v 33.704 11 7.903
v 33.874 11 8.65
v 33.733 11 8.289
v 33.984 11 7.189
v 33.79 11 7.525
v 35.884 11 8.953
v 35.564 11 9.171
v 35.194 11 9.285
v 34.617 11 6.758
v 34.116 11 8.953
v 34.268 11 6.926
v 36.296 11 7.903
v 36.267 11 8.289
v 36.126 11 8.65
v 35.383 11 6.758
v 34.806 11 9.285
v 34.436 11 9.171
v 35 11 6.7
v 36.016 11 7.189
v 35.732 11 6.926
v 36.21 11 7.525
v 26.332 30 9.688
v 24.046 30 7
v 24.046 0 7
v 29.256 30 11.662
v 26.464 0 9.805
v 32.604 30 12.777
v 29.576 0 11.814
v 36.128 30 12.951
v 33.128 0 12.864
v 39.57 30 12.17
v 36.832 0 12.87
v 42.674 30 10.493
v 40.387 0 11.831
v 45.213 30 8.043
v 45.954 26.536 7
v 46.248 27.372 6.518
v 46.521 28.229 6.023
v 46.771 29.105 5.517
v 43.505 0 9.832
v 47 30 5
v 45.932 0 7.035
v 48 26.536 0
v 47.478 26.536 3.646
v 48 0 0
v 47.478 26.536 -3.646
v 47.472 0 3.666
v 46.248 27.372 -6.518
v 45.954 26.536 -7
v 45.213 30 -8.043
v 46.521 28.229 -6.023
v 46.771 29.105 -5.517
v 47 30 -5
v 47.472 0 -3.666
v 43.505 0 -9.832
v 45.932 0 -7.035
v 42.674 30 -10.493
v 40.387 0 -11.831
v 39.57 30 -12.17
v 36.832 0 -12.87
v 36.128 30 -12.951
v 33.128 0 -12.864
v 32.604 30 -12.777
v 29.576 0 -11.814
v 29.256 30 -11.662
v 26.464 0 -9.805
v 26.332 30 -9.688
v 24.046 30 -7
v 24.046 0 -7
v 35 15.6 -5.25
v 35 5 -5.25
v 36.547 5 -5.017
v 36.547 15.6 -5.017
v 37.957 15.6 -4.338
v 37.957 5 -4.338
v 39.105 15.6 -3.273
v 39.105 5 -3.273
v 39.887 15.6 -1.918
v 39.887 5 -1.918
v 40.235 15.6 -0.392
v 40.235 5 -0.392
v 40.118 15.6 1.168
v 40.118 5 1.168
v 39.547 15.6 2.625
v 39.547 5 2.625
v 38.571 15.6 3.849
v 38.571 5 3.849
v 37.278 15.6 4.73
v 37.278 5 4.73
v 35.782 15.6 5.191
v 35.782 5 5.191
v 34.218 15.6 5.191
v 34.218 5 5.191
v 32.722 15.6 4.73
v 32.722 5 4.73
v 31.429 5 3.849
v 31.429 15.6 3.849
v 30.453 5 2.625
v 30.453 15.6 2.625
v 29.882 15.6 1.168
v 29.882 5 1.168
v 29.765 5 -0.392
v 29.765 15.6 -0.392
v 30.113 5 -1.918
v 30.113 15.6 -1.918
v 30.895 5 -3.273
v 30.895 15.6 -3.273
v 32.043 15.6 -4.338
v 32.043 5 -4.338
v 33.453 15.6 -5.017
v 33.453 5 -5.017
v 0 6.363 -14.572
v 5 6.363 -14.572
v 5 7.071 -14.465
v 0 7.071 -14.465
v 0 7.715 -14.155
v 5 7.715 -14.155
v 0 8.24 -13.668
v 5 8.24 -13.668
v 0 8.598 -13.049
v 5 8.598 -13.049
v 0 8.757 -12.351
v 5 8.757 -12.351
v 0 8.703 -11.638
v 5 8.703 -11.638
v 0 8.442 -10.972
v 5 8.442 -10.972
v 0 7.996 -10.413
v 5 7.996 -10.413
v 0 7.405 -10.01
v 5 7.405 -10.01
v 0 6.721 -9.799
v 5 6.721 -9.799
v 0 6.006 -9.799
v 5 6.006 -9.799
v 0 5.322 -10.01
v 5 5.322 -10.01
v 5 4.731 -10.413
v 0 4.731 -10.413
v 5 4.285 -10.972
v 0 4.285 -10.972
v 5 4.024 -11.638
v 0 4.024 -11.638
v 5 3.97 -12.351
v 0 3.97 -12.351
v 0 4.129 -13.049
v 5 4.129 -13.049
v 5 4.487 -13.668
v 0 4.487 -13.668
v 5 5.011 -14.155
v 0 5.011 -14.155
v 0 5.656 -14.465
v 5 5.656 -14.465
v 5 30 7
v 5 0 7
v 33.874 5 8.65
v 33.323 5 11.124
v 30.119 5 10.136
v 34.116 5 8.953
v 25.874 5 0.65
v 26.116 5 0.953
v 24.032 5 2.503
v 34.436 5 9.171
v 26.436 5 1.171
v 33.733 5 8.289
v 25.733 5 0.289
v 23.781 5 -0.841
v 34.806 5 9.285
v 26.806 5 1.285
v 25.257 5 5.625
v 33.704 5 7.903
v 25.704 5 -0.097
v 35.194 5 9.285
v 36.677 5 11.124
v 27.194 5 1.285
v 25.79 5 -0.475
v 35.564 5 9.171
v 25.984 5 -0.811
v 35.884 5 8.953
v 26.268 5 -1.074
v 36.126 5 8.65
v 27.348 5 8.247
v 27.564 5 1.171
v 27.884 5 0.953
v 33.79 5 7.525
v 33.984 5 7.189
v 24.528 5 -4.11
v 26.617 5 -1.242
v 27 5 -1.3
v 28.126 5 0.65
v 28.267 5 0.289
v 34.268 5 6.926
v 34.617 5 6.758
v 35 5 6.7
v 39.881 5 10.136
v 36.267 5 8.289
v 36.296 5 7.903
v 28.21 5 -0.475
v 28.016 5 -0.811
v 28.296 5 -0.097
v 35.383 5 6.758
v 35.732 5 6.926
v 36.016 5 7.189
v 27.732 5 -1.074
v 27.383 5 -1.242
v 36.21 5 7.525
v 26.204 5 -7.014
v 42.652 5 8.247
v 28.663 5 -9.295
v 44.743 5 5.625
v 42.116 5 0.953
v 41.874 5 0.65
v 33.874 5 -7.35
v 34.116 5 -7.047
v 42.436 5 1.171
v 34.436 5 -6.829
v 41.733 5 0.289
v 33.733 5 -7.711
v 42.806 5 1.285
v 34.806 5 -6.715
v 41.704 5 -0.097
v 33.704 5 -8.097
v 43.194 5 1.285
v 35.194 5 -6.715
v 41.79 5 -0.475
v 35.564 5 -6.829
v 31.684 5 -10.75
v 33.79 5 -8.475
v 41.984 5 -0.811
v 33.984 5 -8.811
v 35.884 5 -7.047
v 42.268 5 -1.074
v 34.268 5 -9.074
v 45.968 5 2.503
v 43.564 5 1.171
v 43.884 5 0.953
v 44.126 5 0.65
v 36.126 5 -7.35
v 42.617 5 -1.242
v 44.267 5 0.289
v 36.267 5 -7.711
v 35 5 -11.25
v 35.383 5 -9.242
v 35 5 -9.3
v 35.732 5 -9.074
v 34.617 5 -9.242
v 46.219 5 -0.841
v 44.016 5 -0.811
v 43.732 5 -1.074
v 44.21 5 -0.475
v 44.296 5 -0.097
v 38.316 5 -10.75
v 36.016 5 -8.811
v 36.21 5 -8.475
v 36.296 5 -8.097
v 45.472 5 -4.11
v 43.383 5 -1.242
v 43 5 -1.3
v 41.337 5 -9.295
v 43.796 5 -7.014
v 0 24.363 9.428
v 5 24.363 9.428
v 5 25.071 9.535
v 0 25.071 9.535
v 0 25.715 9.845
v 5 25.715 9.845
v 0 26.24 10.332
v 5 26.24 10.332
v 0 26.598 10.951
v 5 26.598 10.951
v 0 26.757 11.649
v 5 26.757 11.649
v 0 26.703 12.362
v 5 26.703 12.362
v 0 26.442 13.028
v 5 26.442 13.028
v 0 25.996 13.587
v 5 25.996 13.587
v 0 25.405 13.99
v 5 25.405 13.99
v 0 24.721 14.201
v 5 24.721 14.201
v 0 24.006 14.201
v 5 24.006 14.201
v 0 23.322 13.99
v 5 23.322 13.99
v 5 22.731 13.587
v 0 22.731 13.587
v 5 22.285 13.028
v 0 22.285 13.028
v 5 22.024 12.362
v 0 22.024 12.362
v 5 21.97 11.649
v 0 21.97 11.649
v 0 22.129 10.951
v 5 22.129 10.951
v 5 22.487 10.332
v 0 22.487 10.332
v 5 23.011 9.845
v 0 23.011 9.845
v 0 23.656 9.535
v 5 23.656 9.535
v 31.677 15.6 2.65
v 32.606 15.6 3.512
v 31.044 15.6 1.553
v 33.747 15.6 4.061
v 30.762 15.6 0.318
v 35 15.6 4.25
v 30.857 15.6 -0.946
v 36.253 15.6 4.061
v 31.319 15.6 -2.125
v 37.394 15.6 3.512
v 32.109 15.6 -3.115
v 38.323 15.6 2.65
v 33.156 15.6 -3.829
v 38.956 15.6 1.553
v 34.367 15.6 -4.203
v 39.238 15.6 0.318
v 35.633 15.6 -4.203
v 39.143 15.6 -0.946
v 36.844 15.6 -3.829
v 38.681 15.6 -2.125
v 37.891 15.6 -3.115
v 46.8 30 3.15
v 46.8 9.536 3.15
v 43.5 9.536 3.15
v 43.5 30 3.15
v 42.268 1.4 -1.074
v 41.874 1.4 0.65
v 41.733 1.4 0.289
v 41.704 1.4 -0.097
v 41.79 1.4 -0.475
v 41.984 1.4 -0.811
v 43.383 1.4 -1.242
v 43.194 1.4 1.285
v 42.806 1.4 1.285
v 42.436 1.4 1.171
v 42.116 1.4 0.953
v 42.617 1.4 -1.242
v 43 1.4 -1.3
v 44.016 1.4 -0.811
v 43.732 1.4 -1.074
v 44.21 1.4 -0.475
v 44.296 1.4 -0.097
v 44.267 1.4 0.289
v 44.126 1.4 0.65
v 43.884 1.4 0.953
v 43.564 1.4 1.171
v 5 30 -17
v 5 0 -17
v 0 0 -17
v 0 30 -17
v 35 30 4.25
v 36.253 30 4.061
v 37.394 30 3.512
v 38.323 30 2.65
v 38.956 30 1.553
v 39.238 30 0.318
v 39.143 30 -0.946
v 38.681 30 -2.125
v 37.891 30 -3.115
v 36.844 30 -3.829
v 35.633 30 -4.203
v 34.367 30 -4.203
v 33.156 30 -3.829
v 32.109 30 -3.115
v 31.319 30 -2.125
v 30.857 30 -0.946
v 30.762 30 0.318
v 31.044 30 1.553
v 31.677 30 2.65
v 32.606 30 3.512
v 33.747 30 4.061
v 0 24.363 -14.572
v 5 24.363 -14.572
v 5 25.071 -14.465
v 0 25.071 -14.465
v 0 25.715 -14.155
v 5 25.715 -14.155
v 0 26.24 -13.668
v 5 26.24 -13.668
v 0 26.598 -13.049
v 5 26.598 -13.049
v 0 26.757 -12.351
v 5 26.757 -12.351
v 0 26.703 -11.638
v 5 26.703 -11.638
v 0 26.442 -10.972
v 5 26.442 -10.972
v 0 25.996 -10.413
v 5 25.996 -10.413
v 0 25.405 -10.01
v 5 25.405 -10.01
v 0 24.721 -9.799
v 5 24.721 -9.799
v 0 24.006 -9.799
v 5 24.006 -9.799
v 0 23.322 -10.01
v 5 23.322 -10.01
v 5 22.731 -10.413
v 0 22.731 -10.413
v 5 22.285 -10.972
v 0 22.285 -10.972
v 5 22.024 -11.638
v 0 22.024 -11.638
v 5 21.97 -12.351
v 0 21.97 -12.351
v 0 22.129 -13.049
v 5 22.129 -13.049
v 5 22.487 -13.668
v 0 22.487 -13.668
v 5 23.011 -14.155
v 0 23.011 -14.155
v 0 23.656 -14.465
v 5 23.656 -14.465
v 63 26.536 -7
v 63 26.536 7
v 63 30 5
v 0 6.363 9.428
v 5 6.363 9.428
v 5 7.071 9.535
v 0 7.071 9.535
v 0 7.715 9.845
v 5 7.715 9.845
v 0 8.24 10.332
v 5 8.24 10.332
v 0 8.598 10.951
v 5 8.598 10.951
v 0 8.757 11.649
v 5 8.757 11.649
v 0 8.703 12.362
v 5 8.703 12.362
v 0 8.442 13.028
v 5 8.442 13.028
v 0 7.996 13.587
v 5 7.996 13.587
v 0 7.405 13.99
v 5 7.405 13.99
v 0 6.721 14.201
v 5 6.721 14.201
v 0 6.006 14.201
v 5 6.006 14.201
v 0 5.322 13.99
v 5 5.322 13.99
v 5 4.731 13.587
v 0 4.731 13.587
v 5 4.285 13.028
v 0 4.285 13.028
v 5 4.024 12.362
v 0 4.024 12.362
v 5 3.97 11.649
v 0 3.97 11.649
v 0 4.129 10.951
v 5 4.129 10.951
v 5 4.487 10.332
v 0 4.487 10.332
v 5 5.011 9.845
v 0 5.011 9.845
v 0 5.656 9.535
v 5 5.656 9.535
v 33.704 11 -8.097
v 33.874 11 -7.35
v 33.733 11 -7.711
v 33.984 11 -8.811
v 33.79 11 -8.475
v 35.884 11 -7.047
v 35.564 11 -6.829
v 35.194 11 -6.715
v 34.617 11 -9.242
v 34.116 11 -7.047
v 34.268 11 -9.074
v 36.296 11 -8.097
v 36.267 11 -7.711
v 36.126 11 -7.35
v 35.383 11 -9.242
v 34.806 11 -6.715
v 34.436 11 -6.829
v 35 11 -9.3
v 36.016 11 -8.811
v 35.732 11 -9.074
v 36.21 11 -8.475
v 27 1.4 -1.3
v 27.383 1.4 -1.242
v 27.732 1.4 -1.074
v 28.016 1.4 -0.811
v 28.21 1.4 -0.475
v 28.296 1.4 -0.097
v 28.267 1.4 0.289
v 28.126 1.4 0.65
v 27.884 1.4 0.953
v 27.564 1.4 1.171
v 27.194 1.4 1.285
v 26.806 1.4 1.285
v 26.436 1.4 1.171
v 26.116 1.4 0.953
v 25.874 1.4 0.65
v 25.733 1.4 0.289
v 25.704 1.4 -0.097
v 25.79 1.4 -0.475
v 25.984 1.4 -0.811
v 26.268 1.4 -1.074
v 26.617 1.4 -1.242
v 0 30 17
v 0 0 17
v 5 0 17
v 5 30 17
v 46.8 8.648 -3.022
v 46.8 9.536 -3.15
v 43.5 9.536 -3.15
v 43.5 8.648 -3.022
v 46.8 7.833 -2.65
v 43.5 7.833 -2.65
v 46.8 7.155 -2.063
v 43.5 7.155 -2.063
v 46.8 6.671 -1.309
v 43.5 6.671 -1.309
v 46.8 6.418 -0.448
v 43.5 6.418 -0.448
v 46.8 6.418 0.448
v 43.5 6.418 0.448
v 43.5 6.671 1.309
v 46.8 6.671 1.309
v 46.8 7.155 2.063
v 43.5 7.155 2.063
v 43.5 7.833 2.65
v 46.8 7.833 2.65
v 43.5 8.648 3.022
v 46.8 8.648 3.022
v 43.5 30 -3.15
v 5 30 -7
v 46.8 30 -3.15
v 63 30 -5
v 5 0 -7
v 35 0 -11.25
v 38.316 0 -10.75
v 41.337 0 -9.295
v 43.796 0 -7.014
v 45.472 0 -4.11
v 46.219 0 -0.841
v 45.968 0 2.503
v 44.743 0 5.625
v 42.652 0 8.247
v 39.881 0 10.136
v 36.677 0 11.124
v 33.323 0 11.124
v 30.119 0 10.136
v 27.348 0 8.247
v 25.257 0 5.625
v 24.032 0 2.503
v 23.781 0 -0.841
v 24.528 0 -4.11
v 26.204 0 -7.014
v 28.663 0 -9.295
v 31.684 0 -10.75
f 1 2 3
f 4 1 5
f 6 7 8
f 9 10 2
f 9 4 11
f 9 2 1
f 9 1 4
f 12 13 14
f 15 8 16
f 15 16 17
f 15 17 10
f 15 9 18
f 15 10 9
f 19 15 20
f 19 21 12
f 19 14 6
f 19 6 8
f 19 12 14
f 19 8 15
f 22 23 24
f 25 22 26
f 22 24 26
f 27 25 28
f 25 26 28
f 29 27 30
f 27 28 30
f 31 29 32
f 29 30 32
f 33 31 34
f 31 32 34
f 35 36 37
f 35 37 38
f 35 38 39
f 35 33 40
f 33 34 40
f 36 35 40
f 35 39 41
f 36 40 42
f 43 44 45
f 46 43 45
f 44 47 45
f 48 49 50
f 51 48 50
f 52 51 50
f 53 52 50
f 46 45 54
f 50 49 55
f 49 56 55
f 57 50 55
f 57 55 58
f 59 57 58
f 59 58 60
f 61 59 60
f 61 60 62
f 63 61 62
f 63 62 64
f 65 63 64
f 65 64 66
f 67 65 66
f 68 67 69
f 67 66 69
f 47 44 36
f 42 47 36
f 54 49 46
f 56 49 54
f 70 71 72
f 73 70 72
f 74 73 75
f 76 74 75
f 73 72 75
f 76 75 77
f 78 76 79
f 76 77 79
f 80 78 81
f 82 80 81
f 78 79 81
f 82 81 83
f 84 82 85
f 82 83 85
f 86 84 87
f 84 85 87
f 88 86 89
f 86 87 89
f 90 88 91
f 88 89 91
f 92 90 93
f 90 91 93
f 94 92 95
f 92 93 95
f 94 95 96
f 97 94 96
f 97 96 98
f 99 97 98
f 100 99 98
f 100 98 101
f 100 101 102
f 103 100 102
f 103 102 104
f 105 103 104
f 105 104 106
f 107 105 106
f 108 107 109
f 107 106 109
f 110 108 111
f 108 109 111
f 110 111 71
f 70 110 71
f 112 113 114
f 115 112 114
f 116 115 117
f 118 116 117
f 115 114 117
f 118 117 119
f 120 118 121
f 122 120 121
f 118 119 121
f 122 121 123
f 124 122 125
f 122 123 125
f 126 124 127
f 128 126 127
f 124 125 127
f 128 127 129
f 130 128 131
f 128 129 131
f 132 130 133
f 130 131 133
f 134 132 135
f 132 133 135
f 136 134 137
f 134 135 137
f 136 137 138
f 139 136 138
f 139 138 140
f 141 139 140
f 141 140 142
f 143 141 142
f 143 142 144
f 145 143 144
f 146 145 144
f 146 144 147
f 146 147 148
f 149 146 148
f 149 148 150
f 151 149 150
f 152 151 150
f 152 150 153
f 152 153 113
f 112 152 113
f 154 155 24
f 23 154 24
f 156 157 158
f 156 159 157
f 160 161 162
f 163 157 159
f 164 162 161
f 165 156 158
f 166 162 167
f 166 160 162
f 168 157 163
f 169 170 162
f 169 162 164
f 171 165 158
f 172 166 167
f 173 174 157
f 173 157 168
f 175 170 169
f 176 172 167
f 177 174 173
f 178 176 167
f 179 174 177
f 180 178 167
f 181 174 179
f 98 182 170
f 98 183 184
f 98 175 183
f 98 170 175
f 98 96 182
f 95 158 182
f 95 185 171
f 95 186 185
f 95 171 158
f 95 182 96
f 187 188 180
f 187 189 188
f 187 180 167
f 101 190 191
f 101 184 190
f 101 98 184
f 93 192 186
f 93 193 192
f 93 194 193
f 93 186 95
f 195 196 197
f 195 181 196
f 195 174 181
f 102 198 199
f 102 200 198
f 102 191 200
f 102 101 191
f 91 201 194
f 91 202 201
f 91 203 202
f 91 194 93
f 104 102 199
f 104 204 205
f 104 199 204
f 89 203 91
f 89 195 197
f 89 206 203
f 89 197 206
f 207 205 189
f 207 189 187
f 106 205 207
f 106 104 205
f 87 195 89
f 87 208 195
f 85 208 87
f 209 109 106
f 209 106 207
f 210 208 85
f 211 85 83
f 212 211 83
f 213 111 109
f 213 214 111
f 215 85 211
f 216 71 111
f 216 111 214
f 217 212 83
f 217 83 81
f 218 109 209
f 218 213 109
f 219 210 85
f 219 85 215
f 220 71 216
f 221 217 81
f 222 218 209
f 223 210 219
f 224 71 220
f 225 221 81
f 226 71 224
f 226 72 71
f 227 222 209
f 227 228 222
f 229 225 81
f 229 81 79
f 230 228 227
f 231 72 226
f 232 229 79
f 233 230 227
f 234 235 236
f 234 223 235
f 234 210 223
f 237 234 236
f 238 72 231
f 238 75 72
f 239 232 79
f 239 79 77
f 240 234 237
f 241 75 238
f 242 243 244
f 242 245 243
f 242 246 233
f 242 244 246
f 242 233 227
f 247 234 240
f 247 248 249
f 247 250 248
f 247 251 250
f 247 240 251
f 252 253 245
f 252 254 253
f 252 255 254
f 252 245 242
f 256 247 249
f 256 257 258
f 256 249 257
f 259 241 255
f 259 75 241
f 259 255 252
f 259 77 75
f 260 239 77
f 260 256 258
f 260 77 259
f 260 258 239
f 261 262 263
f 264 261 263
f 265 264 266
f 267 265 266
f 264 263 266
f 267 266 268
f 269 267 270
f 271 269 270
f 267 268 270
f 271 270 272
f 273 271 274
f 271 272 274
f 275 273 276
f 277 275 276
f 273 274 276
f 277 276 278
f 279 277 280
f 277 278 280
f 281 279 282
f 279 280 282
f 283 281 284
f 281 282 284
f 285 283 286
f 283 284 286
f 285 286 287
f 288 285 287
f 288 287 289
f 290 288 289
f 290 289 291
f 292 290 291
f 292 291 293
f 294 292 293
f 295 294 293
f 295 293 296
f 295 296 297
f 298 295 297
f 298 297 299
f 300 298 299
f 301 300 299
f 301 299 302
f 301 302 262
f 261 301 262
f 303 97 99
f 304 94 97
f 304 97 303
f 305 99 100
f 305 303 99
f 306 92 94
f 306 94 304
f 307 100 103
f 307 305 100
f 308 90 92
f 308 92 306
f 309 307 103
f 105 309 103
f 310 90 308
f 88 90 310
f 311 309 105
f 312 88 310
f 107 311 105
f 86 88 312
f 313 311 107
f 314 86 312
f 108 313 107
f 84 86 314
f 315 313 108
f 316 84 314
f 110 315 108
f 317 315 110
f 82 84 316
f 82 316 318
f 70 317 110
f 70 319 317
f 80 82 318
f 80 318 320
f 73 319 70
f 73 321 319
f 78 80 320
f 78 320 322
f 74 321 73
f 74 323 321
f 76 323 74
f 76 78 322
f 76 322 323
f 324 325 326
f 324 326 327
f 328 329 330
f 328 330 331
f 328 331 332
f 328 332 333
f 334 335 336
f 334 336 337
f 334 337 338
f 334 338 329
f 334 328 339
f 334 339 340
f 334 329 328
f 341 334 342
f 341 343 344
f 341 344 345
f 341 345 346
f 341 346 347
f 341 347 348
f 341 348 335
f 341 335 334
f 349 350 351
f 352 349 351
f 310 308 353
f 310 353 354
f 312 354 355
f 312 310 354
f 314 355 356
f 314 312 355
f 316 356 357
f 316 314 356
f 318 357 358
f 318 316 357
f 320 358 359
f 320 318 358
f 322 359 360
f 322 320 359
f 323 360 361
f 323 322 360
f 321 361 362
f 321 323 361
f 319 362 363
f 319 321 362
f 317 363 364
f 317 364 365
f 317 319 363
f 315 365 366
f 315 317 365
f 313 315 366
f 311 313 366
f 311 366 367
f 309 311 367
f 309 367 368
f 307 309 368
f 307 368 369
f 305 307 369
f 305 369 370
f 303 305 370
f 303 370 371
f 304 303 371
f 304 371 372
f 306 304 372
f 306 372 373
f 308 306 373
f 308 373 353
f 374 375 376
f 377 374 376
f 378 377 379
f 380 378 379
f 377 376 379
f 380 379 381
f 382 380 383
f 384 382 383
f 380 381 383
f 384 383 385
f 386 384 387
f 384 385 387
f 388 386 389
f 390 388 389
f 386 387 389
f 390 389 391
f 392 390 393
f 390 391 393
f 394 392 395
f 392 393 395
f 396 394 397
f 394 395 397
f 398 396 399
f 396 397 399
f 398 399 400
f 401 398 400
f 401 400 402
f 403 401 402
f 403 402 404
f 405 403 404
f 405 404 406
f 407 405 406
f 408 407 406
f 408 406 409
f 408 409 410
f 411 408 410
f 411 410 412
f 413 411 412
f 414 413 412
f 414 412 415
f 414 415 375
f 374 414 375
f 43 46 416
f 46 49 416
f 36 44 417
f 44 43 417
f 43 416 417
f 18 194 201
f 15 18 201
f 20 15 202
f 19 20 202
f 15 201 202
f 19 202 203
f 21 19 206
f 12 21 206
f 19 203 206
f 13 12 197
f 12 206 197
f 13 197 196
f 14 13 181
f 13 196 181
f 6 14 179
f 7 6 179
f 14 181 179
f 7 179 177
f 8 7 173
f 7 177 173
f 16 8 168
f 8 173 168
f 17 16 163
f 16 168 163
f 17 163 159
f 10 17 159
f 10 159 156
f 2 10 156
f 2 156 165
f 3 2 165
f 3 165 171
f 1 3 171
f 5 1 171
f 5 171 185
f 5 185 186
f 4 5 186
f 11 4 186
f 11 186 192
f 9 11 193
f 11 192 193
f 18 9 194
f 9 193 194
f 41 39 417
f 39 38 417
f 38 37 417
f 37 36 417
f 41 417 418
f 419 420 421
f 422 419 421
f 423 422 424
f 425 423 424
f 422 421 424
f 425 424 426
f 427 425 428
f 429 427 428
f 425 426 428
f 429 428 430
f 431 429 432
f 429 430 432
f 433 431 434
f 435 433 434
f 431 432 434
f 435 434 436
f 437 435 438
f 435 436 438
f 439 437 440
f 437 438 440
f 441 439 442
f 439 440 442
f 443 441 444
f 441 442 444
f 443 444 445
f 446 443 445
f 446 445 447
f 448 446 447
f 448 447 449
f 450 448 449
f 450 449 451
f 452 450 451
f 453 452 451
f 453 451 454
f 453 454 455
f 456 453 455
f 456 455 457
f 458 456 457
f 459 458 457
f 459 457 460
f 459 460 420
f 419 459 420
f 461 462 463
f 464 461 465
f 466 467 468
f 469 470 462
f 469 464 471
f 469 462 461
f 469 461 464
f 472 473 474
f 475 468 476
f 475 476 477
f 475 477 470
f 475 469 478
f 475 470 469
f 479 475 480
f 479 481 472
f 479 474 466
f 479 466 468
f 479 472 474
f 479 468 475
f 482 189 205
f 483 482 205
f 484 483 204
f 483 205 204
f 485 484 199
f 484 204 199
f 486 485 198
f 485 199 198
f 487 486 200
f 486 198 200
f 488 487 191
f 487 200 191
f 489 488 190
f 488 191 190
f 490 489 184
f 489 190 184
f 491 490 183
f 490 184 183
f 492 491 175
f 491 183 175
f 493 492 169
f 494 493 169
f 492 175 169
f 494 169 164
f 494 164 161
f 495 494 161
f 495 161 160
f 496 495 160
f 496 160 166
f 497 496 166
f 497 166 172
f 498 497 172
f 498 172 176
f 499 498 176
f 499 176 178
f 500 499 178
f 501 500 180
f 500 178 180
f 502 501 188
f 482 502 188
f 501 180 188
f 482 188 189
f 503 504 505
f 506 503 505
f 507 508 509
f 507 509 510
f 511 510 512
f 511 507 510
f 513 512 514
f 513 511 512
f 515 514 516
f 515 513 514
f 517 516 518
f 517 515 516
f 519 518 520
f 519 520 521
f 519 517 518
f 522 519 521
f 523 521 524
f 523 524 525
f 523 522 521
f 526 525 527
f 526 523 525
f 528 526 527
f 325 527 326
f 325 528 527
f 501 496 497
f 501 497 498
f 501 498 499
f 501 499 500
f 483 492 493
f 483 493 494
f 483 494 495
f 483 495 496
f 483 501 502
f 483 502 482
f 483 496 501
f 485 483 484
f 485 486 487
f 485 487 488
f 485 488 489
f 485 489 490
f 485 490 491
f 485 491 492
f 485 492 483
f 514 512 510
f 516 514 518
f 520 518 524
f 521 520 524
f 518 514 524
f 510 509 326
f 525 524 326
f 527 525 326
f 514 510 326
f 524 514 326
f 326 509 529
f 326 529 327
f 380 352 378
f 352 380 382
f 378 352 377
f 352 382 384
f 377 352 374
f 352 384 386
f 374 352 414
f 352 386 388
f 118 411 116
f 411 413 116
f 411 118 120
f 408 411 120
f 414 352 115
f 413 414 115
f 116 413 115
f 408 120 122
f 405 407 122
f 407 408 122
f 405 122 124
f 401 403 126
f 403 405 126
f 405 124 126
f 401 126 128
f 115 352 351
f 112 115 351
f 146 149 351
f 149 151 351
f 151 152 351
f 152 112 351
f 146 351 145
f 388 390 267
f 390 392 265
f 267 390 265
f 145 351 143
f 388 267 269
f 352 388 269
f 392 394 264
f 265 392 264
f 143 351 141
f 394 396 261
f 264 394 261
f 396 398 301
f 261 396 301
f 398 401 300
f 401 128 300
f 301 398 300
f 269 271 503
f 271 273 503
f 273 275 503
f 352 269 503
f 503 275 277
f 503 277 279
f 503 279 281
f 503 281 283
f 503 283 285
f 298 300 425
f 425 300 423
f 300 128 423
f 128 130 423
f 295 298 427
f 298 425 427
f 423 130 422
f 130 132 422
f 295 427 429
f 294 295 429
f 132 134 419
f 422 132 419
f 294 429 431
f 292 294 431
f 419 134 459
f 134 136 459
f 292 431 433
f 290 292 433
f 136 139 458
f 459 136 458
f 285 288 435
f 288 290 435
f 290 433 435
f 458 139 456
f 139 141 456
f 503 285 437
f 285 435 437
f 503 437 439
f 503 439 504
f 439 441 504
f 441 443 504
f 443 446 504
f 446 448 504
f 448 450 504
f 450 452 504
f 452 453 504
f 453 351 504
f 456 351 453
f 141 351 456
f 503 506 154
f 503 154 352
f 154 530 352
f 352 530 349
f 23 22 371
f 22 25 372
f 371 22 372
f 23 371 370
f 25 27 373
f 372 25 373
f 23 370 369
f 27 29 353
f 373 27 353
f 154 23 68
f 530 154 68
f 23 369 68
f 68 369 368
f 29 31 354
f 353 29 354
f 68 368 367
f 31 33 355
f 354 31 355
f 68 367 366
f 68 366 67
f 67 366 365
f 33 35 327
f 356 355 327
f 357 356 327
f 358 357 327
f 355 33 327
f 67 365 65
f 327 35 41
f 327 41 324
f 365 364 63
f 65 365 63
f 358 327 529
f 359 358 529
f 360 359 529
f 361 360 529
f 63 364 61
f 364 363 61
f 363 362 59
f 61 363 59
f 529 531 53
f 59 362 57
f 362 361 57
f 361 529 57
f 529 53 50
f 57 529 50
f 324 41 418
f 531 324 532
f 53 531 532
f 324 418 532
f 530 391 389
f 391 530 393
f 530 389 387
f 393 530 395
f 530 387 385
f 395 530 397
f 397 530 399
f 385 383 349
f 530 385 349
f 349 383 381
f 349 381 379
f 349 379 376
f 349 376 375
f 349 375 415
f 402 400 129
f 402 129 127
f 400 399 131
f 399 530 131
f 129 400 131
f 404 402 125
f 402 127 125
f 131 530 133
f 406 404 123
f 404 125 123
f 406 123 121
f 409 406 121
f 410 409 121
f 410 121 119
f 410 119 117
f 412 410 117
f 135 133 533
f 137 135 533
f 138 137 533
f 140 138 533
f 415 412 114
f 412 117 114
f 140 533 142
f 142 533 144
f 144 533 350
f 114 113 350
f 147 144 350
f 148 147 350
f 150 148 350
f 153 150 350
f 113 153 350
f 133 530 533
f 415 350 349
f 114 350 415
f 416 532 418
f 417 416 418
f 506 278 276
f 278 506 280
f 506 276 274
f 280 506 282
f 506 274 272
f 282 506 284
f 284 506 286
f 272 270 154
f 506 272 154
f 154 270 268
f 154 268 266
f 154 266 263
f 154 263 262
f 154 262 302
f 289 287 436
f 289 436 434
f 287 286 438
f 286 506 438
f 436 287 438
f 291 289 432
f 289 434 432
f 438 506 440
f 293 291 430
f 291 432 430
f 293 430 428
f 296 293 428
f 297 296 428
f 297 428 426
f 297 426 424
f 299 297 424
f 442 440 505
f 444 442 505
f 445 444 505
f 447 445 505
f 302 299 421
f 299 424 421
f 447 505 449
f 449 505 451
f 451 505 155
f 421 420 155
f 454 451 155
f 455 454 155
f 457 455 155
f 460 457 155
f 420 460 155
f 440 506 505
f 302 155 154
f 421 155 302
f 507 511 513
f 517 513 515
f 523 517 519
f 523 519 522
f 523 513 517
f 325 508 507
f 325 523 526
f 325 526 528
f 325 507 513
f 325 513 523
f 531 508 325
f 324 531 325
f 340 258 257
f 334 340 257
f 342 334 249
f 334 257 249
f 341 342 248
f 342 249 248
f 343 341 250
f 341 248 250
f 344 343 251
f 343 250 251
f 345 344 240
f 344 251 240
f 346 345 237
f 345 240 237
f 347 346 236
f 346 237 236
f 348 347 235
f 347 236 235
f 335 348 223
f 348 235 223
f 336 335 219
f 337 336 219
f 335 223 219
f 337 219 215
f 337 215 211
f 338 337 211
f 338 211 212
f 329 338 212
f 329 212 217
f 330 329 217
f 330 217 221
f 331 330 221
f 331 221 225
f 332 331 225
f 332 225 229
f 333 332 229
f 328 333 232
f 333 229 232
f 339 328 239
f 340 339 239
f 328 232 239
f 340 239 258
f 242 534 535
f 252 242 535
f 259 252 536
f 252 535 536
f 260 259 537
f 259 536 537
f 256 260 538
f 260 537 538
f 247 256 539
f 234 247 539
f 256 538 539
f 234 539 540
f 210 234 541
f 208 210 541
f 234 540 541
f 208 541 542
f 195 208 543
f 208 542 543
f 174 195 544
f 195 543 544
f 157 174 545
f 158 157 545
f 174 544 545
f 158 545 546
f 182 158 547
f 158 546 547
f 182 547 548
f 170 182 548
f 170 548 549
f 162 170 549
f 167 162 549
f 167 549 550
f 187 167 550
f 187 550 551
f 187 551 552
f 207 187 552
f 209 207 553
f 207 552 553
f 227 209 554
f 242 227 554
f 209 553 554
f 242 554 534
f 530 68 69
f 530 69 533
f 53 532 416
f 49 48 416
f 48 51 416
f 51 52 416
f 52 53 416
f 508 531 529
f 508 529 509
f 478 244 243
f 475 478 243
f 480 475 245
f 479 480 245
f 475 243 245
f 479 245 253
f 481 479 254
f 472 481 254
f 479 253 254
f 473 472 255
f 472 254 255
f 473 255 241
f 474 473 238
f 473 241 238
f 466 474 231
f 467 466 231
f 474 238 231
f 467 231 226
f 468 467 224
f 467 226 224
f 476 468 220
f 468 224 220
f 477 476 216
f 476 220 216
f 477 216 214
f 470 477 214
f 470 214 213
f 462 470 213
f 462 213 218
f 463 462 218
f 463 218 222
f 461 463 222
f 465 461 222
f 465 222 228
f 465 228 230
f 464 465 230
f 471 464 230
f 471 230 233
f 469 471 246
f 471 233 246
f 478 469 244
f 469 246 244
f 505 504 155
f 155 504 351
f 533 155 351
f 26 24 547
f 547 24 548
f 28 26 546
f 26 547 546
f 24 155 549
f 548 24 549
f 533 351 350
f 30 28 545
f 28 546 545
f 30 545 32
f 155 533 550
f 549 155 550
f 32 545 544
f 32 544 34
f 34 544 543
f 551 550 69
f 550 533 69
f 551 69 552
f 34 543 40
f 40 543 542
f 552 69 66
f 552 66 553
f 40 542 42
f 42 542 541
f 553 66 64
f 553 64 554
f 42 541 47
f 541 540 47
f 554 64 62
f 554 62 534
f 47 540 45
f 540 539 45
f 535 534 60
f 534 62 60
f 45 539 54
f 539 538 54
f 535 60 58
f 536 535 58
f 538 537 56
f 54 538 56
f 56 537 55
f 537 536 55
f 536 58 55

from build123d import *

# Parameters (mm, degrees)
SKETCH2_R                            = 4.25
BOSS_EXTRUDE1_DEPTH                  = 30
SKETCH3_R                            = 11.25
SKETCH3_R_2                          = 5.25
SKETCH3_R_3                          = 4.25
CUT_EXTRUDE1_DEPTH                   = 5
CUT_EXTRUDE2_START                   = -5
SKETCH3_3_R                          = 5.25
SKETCH3_3_R_2                        = 4.25
CUT_EXTRUDE2_DEPTH                   = 10.6
SKETCH4_R                            = 2.4
CUT_EXTRUDE3_DEPTH                   = 56.118055118
SKETCH5_R                            = 1.3
CUT_EXTRUDE4_DEPTH                   = 6
SKETCH5_3_R                          = 1.3
BOSS_EXTRUDE2_DEPTH                  = 3.6
BOSS_EXTRUDE3_DEPTH                  = 15
BOSS_EXTRUDE3_DIRECTION_2_REACH      = 61.102
BOSS_EXTRUDE3_DIRECTION_2_END_RADIUS = 13
CUT_EXTRUDE5_START                   = -1.2
CUT_EXTRUDE5_DEPTH                   = 3.3


with BuildPart() as part:
    # Sketch2 → Boss-Extrude1 (new body)
    with BuildSketch(Plane(origin=(0, 0, 0), x_dir=(1, 0, 0), z_dir=(0, 1, 0))):
        with BuildLine():
            Line((0, 17), (0, -17))
            Line((0, -17), (5, -17))
            Line((5, -17), (5, -7))
            Line((5, -7), (24.04554885, -7))
            ThreePointArc((24.04554885, -7), (48, 0), (24.04554885, 7))
            Line((24.04554885, 7), (5, 7))
            Line((5, 7), (5, 17))
            Line((5, 17), (0, 17))
        make_face()
        with Locations(Location((35, 0, 0), (0, 0, 270))):
            Circle(SKETCH2_R, mode=Mode.SUBTRACT)
    extrude(amount=BOSS_EXTRUDE1_DEPTH)

    # Sketch3 → Cut-Extrude1 (cut)
    with BuildSketch(Plane.XZ):
        with Locations(Location((35, 0, 0), (0, 0, 270))):
            Circle(SKETCH3_R)
        with Locations((35, 0)):
            Circle(SKETCH3_R_2, mode=Mode.SUBTRACT)
        with Locations((35, 0)):
            Circle(SKETCH3_R_2)
        with Locations(Location((35, 0, 0), (0, 0, 270))):
            Circle(SKETCH3_R_3, mode=Mode.SUBTRACT)
    extrude(amount=-CUT_EXTRUDE1_DEPTH, mode=Mode.SUBTRACT)

    # Sketch3<3> → Cut-Extrude2 (cut)
    with BuildSketch(Plane.XZ.offset(CUT_EXTRUDE2_START)):
        with Locations(Location((35, 0, 0), (0, 0, 270))):
            Circle(SKETCH3_3_R)
        with Locations(Location((35, 0, 0), (0, 0, 270))):
            Circle(SKETCH3_3_R_2, mode=Mode.SUBTRACT)
    extrude(amount=-CUT_EXTRUDE2_DEPTH, mode=Mode.SUBTRACT)

    # Sketch4 → Cut-Extrude3 (cut, through all)
    with BuildSketch(Plane(origin=(5, 0, 0), x_dir=(0, 0, -1), z_dir=(1, 0, 0))):
        with Locations((12.17186788, 24.363439063)):
            Circle(SKETCH4_R)
        with Locations((12.17186788, 6.363439063)):
            Circle(SKETCH4_R)
        with Locations((-11.82813212, 6.363439063)):
            Circle(SKETCH4_R)
        with Locations((-11.82813212, 24.363439063)):
            Circle(SKETCH4_R)
    extrude(amount=-CUT_EXTRUDE3_DEPTH, mode=Mode.SUBTRACT)

    # Sketch5 → Cut-Extrude4 (cut)
    with BuildSketch(Plane.XZ.offset(-5)):
        with Locations(Location((35, 8, 0), (0, 0, 270))):
            Circle(SKETCH5_R)
        with Locations(Location((35, -8, 0), (0, 0, 270))):
            Circle(SKETCH5_R)
    extrude(amount=-CUT_EXTRUDE4_DEPTH, mode=Mode.SUBTRACT)

    # Sketch5<3> → Boss-Extrude2 (add)
    with BuildSketch(Plane.XZ.offset(-5)):
        with Locations(Location((27, 0, 0), (0, 0, 270))):
            Circle(SKETCH5_3_R)
        with Locations(Location((43, 0, 0), (0, 0, 270))):
            Circle(SKETCH5_3_R)
    extrude(amount=BOSS_EXTRUDE2_DEPTH)


with BuildPart() as boss_extrude3_tool:
    # Sketch7 → Boss-Extrude3 (new body)
    with BuildSketch(Plane(origin=(48, 0, 0), x_dir=(0, 0, -1), z_dir=(1, 0, 0))):
        Polygon((-5, 30), (5, 30), (7, 26.535898385), (-7, 26.535898385), align=None)
    extrude(amount=BOSS_EXTRUDE3_DEPTH)


with BuildPart() as part_1:
    add(part.part)


with BuildPart() as part_2:
    # Boss-Extrude3: joined with boss_extrude3_tool
    add(part_1.part.fuse(boss_extrude3_tool.part, tol=0.00001))

    # Boss-Extrude3 direction 2: up to this cylinder (the profile starts outside it)
    boss_extrude3_direction_2_end = Plane(origin=(35, 28.171724, 0), z_dir=(0, -1, 0)) * Cylinder(BOSS_EXTRUDE3_DIRECTION_2_END_RADIUS, 149.204, mode=Mode.PRIVATE)
    # Sketch7 → Boss-Extrude3 direction 2 (add, up to the surface)
    with BuildSketch(Plane(origin=(48, 0, 0), x_dir=(0, 0, -1), z_dir=(1, 0, 0)), mode=Mode.PRIVATE) as boss_extrude3_direction_2_sk1:
        Polygon((-5, 30), (5, 30), (7, 26.535898385), (-7, 26.535898385), align=None)
    boss_extrude3_direction_2_tool1 = extrude(boss_extrude3_direction_2_sk1.sketch, amount=-BOSS_EXTRUDE3_DIRECTION_2_REACH, mode=Mode.PRIVATE) - boss_extrude3_direction_2_end
    add(boss_extrude3_direction_2_tool1.solids().sort_by_distance((48, 28.171724, 0))[0])
    add(boss_extrude3_direction_2_tool1.solids().sort_by_distance((48, 28.171724, 0))[1])

    # Sketch9 → Cut-Extrude5 (cut)
    with BuildSketch(Plane(origin=(48, 0, 0), x_dir=(0, 0, -1), z_dir=(1, 0, 0)).offset(CUT_EXTRUDE5_START)):
        with BuildLine():
            Line((3.15, 30.472989279), (3.15, 9.535898385))
            ThreePointArc((3.15, 9.535898385), (0, 6.385898385), (-3.15, 9.535898385))
            Line((-3.15, 9.535898385), (-3.15, 30.472989279))
            ThreePointArc((-3.15, 30.472989279), (0, 33.622989279), (3.15, 30.472989279))
        make_face()
    extrude(amount=-CUT_EXTRUDE5_DEPTH, mode=Mode.SUBTRACT)


solid = part_2.part
